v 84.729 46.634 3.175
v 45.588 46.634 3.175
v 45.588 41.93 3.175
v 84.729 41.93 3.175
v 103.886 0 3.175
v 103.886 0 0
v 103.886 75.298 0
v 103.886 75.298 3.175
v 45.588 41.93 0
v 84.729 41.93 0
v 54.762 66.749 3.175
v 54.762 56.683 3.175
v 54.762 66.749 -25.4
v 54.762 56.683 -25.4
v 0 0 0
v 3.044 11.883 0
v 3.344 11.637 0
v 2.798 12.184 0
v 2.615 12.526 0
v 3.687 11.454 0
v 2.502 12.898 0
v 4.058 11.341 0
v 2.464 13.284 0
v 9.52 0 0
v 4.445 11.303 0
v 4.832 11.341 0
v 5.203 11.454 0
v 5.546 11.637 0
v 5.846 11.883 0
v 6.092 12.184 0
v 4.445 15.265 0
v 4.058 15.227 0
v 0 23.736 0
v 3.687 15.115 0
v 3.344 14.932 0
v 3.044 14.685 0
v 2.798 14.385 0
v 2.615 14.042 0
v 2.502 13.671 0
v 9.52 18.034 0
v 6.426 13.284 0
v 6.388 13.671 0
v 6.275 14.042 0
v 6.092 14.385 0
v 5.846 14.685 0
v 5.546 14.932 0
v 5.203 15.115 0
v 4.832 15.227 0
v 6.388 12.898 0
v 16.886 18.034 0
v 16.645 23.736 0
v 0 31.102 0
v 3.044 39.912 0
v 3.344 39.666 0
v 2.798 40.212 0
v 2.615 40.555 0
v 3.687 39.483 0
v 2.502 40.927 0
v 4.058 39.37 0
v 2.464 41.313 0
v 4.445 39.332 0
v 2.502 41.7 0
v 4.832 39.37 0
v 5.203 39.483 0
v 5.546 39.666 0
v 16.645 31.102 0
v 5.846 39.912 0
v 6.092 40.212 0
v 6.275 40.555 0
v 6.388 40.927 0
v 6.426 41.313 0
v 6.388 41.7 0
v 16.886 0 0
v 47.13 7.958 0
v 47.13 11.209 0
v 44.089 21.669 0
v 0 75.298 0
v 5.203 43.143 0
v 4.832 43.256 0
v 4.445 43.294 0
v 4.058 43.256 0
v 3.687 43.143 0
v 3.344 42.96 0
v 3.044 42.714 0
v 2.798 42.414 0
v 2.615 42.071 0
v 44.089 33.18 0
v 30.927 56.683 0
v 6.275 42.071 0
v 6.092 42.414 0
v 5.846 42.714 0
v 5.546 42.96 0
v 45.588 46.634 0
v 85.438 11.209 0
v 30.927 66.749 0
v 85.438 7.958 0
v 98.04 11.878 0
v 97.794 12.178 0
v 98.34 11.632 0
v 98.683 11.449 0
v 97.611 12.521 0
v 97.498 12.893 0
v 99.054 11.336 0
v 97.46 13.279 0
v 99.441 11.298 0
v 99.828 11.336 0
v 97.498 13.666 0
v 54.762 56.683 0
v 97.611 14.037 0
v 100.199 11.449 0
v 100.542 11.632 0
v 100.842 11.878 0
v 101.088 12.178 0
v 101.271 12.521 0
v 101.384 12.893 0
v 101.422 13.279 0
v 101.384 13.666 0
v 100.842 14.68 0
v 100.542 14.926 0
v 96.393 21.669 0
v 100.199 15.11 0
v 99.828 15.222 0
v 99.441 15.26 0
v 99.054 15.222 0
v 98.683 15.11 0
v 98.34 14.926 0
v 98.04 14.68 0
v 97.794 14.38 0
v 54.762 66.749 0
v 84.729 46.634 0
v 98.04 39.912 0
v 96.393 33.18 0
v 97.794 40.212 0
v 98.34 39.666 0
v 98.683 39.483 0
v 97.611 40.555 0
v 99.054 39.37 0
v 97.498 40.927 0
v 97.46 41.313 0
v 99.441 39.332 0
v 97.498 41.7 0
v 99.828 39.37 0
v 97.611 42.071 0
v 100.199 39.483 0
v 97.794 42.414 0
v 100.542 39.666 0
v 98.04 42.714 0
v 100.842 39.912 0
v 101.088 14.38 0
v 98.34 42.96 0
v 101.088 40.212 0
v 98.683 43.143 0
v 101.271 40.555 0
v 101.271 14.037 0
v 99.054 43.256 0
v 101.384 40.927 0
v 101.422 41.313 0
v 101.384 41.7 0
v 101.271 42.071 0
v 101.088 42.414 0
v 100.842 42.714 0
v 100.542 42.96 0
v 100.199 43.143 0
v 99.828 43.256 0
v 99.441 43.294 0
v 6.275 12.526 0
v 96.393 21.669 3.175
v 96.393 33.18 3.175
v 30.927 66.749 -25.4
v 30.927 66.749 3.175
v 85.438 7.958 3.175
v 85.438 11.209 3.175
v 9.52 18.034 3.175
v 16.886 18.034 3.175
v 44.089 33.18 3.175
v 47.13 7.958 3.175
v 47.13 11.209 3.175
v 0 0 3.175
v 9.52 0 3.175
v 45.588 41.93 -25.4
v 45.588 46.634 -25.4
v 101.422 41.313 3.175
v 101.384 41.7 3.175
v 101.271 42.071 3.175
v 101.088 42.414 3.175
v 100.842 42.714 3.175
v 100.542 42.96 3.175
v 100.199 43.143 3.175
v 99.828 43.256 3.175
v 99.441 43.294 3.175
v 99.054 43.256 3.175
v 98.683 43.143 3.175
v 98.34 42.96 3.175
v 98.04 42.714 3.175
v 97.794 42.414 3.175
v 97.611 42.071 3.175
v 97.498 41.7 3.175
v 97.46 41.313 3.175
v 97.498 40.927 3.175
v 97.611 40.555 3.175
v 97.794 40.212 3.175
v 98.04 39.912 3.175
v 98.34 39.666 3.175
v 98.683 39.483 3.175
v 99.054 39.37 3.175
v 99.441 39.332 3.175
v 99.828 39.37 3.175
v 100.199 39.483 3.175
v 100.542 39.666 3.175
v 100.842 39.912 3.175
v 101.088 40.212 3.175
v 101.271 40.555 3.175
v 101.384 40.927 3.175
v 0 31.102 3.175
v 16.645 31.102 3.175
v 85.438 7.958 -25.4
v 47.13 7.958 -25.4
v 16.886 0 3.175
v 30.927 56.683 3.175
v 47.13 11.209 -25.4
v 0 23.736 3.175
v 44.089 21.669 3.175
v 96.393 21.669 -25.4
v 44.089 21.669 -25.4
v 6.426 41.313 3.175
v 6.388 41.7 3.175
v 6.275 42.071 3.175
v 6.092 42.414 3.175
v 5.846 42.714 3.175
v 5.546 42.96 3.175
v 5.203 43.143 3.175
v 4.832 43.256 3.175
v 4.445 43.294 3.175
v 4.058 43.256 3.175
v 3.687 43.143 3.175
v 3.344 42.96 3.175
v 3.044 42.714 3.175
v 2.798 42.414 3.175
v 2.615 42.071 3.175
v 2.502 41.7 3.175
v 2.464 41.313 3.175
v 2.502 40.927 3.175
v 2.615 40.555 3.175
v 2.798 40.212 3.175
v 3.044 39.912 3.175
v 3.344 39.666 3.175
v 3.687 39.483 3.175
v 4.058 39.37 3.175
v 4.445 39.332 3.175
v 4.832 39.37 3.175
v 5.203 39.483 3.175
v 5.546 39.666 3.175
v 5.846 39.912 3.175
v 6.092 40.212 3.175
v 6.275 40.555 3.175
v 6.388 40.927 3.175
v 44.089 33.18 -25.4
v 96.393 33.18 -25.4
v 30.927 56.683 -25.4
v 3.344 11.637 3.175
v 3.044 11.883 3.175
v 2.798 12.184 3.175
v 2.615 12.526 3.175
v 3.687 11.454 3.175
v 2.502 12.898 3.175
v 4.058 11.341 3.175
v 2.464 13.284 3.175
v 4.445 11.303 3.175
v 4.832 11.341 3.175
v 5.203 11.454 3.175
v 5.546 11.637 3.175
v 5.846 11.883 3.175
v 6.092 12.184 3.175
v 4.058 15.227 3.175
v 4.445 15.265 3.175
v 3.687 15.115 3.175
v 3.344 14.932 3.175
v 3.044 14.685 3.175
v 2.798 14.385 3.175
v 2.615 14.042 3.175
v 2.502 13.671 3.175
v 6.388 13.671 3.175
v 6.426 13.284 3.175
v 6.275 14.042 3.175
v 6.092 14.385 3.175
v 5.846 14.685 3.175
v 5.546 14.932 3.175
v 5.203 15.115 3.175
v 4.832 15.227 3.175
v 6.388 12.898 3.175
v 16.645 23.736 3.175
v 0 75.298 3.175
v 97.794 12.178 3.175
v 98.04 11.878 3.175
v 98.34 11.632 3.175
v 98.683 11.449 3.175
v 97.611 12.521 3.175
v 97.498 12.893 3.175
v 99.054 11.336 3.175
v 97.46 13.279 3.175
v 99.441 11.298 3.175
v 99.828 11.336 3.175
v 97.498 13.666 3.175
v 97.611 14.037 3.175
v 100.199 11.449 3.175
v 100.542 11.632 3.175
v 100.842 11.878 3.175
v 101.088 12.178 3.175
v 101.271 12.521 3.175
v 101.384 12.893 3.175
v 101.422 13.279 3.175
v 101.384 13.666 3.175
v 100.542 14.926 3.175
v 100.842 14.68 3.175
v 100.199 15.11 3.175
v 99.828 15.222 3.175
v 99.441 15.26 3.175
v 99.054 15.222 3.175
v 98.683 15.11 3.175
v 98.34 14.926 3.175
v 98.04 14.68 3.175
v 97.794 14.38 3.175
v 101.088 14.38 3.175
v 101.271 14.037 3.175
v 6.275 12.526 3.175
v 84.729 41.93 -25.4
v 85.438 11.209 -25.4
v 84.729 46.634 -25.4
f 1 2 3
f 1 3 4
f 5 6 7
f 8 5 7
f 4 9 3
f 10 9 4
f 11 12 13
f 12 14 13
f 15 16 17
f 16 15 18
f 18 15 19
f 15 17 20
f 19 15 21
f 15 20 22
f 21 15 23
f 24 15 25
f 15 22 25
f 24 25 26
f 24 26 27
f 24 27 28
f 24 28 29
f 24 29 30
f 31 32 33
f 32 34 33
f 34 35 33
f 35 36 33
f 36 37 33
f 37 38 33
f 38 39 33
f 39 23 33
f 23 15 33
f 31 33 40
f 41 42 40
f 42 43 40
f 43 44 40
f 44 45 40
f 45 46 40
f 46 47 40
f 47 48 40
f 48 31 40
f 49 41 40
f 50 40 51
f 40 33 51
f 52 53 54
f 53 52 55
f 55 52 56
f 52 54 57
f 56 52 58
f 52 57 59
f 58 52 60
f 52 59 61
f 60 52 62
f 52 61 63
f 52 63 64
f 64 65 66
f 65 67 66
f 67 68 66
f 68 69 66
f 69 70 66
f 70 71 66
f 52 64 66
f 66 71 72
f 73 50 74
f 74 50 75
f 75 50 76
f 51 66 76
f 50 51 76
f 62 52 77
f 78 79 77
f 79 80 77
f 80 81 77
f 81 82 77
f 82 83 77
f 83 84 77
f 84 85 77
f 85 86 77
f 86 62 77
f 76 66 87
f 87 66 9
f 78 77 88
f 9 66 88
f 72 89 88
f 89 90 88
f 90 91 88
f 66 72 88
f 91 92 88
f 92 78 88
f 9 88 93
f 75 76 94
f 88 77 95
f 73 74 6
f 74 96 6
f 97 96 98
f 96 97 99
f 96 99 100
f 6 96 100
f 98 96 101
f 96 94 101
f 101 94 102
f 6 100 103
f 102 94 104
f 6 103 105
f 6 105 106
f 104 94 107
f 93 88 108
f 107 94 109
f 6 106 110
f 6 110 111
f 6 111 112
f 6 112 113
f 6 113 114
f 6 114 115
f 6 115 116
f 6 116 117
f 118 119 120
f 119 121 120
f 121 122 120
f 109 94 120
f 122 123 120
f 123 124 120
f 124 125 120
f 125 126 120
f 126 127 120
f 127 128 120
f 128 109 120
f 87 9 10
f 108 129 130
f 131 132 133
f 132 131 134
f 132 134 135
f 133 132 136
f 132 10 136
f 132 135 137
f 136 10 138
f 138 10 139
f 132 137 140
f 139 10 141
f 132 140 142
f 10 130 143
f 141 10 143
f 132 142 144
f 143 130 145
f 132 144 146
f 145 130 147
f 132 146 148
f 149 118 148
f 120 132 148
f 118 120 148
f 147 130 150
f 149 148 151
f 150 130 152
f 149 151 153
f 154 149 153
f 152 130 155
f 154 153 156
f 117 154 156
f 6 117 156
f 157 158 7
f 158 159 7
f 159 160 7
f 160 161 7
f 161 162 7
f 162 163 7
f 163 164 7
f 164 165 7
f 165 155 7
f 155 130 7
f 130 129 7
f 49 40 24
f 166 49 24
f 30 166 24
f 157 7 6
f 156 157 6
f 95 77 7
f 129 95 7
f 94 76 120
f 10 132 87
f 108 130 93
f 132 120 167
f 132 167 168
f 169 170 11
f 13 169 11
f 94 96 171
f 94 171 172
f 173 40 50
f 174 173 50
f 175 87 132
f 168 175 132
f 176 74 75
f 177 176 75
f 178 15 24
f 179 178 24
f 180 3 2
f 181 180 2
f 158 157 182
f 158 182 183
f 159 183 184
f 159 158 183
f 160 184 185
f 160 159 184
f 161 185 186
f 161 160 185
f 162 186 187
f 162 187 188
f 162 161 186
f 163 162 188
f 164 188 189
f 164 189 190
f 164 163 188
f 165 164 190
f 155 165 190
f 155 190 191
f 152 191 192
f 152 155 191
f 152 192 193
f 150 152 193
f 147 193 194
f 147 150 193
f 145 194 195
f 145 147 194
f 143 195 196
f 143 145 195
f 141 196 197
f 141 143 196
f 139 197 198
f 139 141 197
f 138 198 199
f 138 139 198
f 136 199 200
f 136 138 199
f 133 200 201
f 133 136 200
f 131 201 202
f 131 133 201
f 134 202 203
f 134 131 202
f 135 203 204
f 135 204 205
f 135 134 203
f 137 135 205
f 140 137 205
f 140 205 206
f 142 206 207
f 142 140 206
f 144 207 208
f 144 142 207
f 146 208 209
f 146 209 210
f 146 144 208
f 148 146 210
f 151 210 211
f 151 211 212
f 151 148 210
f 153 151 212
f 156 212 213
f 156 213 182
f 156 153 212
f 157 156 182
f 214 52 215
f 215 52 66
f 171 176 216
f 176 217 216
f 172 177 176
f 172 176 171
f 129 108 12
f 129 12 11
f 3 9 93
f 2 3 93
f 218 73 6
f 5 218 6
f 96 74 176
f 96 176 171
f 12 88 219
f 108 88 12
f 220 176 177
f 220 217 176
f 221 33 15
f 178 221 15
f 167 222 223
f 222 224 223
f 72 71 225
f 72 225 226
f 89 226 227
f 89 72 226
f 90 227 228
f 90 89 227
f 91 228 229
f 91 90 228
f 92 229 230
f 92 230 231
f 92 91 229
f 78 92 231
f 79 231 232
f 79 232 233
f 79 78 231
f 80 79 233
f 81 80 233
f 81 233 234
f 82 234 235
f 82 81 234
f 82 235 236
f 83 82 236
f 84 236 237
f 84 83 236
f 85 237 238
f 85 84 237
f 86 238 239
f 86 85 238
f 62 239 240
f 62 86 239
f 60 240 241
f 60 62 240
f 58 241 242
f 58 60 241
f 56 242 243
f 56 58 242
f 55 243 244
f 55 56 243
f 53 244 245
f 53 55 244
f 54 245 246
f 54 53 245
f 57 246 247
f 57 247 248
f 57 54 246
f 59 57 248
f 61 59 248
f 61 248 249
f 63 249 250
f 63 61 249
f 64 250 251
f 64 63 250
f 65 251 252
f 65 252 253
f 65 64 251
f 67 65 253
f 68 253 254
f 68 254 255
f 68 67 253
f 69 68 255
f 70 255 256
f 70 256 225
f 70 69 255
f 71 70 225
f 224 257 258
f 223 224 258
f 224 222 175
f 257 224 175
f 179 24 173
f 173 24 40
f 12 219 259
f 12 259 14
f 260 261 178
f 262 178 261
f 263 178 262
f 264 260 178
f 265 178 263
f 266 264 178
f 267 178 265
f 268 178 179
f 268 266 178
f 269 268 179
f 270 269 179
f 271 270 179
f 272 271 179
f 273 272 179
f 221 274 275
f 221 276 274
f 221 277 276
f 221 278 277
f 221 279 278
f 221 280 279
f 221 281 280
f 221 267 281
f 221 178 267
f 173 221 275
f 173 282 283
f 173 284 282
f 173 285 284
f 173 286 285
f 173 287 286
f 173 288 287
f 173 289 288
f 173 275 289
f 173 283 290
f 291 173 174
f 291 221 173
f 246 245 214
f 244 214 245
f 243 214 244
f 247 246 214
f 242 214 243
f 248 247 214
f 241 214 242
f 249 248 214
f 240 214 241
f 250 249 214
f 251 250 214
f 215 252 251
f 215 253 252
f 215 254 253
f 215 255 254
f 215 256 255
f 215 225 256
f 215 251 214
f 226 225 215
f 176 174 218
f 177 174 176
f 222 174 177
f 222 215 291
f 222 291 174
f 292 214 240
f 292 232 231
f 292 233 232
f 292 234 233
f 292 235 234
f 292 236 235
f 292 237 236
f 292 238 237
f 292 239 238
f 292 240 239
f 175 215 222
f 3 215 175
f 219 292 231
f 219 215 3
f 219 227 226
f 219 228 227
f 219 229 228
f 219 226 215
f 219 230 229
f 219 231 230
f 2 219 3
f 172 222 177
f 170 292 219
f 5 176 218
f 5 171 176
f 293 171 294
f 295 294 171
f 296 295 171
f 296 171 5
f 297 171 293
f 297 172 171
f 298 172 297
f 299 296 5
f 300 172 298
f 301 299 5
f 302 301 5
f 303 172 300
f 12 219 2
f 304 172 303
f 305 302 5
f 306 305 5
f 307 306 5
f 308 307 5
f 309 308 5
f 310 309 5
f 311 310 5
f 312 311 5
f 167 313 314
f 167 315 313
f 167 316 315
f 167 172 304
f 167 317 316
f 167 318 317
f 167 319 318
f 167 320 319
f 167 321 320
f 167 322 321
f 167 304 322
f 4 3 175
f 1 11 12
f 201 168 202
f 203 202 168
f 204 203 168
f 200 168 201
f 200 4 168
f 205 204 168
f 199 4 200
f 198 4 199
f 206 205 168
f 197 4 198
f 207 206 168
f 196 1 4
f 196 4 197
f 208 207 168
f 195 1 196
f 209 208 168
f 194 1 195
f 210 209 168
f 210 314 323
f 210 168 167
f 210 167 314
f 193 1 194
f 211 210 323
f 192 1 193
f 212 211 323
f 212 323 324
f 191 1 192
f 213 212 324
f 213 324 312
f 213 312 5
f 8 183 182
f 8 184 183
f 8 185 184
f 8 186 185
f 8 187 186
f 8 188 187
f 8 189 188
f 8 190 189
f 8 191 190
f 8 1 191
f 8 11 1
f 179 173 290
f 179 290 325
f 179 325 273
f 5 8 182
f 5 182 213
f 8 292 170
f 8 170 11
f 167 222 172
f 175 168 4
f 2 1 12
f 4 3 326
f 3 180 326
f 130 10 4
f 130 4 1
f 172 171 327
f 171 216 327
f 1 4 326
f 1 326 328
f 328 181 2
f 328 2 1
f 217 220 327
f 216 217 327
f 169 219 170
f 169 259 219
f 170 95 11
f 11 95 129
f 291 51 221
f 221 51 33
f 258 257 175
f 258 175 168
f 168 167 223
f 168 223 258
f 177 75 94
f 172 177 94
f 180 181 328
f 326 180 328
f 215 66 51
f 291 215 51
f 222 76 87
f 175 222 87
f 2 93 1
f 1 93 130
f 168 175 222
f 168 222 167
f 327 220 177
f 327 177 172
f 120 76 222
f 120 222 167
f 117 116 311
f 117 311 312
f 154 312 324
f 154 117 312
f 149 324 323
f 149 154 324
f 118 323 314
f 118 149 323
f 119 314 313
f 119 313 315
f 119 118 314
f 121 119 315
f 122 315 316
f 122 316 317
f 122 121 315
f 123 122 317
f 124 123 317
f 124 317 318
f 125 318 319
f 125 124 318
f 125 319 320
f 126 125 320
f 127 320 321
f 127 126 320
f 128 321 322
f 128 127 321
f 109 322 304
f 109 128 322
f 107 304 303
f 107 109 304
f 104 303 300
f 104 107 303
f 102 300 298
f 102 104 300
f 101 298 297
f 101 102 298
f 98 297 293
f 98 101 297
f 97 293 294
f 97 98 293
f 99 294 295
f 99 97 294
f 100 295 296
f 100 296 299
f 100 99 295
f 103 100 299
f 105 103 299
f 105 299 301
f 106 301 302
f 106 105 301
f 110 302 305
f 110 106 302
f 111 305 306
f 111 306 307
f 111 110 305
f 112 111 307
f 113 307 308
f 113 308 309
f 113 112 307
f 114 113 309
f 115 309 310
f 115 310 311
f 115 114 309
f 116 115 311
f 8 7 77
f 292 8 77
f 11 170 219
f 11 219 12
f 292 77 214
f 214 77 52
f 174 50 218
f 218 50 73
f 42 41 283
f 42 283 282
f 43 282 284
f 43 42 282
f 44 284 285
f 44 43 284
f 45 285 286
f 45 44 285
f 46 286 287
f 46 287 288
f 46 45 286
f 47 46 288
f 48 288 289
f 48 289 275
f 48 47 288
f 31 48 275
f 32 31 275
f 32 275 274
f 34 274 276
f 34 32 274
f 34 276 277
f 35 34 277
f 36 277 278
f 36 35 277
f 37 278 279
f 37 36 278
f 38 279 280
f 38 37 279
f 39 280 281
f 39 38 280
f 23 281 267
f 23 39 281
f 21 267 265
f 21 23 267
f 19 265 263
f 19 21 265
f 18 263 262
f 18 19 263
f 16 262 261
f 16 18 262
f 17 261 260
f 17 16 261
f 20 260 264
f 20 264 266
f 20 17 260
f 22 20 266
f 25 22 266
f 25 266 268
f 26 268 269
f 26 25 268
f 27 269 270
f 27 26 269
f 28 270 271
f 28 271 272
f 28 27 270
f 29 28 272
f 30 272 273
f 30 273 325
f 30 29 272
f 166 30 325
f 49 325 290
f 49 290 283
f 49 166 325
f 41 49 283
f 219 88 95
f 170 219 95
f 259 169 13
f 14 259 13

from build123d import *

# Parameters (mm, degrees)
F0_W          = 52.30368
F0_H          = 11.51128
F1_DEPTH      = 25.4
F1_DEPTH_BACK = 3.175
F0_W_2        = 38.30828
F0_H_2        = 3.2512
F0_W_3        = 39.1414
F0_H_3        = 4.70408
F0_W_4        = 23.83536
F0_H_4        = 10.06602
F0_R          = 1.9812
F2_DEPTH      = 3.175


with BuildPart() as f1:
    # F0 (on Top) → F1 (new body, two sides)
    with BuildSketch(Plane.XY) as f1_sk:
        with Locations((70.24116, 27.42438)):
            Rectangle(F0_W, F0_H)
    extrude(amount=-F1_DEPTH)
    extrude(f1_sk.sketch, amount=F1_DEPTH_BACK)


with BuildPart() as f1b:
    # F0 (on Top) → F1, piece 2 (new body, two sides)
    with BuildSketch(Plane.XY) as f1_2_sk:
        with Locations((66.28384, 9.58342)):
            Rectangle(F0_W_2, F0_H_2)
    extrude(amount=-F1_DEPTH)
    extrude(f1_2_sk.sketch, amount=F1_DEPTH_BACK)


with BuildPart() as f1c:
    # F0 (on Top) → F1, piece 3 (new body, two sides)
    with BuildSketch(Plane.XY) as f1_3_sk:
        with Locations((65.15862, 44.28236)):
            Rectangle(F0_W_3, F0_H_3)
    extrude(amount=-F1_DEPTH)
    extrude(f1_3_sk.sketch, amount=F1_DEPTH_BACK)


with BuildPart() as f1d:
    # F0 (on Top) → F1, piece 4 (new body, two sides)
    with BuildSketch(Plane.XY) as f1_4_sk:
        with Locations((42.84472, 61.71565)):
            Rectangle(F0_W_4, F0_H_4)
    extrude(amount=-F1_DEPTH)
    extrude(f1_4_sk.sketch, amount=F1_DEPTH_BACK)


with BuildPart() as f2:
    # F0 (on Top) → F2 (new body)
    with BuildSketch(Plane.XY):
        Polygon((0, 23.7363), (0, 0), (9.51992, 0), (9.51992, 18.034), (16.88592, 18.034), (16.88592, 0), (103.886, 0), (103.886, 75.2983), (0, 75.2983), (0, 31.1023), (16.64462, 31.1023), (16.64462, 23.7363), align=None)
        with Locations((4.445, 13.2842)):
            Circle(F0_R, mode=Mode.SUBTRACT)
        with Locations((66.28384, 9.58342)):
            Rectangle(F0_W_2, F0_H_2, mode=Mode.SUBTRACT)
        with Locations((99.441, 13.27912)):
            Circle(F0_R, mode=Mode.SUBTRACT)
        with Locations((70.24116, 27.42438)):
            Rectangle(F0_W, F0_H, mode=Mode.SUBTRACT)
        with Locations((4.445, 41.3131)):
            Circle(F0_R, mode=Mode.SUBTRACT)
        with Locations((42.84472, 61.71565)):
            Rectangle(F0_W_4, F0_H_4, mode=Mode.SUBTRACT)
        with Locations((65.15862, 44.28236)):
            Rectangle(F0_W_3, F0_H_3, mode=Mode.SUBTRACT)
        with Locations((99.441, 41.3131)):
            Circle(F0_R, mode=Mode.SUBTRACT)
    extrude(amount=F2_DEPTH)


solid = Compound([f1.part, f1b.part, f1c.part, f1d.part, f2.part])
